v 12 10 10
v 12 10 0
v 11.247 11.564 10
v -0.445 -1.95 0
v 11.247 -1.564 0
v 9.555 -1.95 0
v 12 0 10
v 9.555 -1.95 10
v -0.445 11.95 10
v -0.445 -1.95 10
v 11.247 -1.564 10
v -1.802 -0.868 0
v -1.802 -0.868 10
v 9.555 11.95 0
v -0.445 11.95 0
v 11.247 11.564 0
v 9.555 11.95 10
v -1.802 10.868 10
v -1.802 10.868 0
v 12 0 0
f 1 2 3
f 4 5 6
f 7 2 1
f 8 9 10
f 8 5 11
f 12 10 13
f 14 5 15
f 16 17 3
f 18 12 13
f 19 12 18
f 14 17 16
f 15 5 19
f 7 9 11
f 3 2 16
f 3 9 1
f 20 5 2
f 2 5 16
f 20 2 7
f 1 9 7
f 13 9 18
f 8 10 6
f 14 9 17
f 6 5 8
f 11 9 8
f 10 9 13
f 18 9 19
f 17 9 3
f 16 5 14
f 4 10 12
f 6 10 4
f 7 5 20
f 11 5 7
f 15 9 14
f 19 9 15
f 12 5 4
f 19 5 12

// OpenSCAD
minkowski() {
    cube([10, 10, 10]);
    cylinder(r=2, h=0.0000001);
}
